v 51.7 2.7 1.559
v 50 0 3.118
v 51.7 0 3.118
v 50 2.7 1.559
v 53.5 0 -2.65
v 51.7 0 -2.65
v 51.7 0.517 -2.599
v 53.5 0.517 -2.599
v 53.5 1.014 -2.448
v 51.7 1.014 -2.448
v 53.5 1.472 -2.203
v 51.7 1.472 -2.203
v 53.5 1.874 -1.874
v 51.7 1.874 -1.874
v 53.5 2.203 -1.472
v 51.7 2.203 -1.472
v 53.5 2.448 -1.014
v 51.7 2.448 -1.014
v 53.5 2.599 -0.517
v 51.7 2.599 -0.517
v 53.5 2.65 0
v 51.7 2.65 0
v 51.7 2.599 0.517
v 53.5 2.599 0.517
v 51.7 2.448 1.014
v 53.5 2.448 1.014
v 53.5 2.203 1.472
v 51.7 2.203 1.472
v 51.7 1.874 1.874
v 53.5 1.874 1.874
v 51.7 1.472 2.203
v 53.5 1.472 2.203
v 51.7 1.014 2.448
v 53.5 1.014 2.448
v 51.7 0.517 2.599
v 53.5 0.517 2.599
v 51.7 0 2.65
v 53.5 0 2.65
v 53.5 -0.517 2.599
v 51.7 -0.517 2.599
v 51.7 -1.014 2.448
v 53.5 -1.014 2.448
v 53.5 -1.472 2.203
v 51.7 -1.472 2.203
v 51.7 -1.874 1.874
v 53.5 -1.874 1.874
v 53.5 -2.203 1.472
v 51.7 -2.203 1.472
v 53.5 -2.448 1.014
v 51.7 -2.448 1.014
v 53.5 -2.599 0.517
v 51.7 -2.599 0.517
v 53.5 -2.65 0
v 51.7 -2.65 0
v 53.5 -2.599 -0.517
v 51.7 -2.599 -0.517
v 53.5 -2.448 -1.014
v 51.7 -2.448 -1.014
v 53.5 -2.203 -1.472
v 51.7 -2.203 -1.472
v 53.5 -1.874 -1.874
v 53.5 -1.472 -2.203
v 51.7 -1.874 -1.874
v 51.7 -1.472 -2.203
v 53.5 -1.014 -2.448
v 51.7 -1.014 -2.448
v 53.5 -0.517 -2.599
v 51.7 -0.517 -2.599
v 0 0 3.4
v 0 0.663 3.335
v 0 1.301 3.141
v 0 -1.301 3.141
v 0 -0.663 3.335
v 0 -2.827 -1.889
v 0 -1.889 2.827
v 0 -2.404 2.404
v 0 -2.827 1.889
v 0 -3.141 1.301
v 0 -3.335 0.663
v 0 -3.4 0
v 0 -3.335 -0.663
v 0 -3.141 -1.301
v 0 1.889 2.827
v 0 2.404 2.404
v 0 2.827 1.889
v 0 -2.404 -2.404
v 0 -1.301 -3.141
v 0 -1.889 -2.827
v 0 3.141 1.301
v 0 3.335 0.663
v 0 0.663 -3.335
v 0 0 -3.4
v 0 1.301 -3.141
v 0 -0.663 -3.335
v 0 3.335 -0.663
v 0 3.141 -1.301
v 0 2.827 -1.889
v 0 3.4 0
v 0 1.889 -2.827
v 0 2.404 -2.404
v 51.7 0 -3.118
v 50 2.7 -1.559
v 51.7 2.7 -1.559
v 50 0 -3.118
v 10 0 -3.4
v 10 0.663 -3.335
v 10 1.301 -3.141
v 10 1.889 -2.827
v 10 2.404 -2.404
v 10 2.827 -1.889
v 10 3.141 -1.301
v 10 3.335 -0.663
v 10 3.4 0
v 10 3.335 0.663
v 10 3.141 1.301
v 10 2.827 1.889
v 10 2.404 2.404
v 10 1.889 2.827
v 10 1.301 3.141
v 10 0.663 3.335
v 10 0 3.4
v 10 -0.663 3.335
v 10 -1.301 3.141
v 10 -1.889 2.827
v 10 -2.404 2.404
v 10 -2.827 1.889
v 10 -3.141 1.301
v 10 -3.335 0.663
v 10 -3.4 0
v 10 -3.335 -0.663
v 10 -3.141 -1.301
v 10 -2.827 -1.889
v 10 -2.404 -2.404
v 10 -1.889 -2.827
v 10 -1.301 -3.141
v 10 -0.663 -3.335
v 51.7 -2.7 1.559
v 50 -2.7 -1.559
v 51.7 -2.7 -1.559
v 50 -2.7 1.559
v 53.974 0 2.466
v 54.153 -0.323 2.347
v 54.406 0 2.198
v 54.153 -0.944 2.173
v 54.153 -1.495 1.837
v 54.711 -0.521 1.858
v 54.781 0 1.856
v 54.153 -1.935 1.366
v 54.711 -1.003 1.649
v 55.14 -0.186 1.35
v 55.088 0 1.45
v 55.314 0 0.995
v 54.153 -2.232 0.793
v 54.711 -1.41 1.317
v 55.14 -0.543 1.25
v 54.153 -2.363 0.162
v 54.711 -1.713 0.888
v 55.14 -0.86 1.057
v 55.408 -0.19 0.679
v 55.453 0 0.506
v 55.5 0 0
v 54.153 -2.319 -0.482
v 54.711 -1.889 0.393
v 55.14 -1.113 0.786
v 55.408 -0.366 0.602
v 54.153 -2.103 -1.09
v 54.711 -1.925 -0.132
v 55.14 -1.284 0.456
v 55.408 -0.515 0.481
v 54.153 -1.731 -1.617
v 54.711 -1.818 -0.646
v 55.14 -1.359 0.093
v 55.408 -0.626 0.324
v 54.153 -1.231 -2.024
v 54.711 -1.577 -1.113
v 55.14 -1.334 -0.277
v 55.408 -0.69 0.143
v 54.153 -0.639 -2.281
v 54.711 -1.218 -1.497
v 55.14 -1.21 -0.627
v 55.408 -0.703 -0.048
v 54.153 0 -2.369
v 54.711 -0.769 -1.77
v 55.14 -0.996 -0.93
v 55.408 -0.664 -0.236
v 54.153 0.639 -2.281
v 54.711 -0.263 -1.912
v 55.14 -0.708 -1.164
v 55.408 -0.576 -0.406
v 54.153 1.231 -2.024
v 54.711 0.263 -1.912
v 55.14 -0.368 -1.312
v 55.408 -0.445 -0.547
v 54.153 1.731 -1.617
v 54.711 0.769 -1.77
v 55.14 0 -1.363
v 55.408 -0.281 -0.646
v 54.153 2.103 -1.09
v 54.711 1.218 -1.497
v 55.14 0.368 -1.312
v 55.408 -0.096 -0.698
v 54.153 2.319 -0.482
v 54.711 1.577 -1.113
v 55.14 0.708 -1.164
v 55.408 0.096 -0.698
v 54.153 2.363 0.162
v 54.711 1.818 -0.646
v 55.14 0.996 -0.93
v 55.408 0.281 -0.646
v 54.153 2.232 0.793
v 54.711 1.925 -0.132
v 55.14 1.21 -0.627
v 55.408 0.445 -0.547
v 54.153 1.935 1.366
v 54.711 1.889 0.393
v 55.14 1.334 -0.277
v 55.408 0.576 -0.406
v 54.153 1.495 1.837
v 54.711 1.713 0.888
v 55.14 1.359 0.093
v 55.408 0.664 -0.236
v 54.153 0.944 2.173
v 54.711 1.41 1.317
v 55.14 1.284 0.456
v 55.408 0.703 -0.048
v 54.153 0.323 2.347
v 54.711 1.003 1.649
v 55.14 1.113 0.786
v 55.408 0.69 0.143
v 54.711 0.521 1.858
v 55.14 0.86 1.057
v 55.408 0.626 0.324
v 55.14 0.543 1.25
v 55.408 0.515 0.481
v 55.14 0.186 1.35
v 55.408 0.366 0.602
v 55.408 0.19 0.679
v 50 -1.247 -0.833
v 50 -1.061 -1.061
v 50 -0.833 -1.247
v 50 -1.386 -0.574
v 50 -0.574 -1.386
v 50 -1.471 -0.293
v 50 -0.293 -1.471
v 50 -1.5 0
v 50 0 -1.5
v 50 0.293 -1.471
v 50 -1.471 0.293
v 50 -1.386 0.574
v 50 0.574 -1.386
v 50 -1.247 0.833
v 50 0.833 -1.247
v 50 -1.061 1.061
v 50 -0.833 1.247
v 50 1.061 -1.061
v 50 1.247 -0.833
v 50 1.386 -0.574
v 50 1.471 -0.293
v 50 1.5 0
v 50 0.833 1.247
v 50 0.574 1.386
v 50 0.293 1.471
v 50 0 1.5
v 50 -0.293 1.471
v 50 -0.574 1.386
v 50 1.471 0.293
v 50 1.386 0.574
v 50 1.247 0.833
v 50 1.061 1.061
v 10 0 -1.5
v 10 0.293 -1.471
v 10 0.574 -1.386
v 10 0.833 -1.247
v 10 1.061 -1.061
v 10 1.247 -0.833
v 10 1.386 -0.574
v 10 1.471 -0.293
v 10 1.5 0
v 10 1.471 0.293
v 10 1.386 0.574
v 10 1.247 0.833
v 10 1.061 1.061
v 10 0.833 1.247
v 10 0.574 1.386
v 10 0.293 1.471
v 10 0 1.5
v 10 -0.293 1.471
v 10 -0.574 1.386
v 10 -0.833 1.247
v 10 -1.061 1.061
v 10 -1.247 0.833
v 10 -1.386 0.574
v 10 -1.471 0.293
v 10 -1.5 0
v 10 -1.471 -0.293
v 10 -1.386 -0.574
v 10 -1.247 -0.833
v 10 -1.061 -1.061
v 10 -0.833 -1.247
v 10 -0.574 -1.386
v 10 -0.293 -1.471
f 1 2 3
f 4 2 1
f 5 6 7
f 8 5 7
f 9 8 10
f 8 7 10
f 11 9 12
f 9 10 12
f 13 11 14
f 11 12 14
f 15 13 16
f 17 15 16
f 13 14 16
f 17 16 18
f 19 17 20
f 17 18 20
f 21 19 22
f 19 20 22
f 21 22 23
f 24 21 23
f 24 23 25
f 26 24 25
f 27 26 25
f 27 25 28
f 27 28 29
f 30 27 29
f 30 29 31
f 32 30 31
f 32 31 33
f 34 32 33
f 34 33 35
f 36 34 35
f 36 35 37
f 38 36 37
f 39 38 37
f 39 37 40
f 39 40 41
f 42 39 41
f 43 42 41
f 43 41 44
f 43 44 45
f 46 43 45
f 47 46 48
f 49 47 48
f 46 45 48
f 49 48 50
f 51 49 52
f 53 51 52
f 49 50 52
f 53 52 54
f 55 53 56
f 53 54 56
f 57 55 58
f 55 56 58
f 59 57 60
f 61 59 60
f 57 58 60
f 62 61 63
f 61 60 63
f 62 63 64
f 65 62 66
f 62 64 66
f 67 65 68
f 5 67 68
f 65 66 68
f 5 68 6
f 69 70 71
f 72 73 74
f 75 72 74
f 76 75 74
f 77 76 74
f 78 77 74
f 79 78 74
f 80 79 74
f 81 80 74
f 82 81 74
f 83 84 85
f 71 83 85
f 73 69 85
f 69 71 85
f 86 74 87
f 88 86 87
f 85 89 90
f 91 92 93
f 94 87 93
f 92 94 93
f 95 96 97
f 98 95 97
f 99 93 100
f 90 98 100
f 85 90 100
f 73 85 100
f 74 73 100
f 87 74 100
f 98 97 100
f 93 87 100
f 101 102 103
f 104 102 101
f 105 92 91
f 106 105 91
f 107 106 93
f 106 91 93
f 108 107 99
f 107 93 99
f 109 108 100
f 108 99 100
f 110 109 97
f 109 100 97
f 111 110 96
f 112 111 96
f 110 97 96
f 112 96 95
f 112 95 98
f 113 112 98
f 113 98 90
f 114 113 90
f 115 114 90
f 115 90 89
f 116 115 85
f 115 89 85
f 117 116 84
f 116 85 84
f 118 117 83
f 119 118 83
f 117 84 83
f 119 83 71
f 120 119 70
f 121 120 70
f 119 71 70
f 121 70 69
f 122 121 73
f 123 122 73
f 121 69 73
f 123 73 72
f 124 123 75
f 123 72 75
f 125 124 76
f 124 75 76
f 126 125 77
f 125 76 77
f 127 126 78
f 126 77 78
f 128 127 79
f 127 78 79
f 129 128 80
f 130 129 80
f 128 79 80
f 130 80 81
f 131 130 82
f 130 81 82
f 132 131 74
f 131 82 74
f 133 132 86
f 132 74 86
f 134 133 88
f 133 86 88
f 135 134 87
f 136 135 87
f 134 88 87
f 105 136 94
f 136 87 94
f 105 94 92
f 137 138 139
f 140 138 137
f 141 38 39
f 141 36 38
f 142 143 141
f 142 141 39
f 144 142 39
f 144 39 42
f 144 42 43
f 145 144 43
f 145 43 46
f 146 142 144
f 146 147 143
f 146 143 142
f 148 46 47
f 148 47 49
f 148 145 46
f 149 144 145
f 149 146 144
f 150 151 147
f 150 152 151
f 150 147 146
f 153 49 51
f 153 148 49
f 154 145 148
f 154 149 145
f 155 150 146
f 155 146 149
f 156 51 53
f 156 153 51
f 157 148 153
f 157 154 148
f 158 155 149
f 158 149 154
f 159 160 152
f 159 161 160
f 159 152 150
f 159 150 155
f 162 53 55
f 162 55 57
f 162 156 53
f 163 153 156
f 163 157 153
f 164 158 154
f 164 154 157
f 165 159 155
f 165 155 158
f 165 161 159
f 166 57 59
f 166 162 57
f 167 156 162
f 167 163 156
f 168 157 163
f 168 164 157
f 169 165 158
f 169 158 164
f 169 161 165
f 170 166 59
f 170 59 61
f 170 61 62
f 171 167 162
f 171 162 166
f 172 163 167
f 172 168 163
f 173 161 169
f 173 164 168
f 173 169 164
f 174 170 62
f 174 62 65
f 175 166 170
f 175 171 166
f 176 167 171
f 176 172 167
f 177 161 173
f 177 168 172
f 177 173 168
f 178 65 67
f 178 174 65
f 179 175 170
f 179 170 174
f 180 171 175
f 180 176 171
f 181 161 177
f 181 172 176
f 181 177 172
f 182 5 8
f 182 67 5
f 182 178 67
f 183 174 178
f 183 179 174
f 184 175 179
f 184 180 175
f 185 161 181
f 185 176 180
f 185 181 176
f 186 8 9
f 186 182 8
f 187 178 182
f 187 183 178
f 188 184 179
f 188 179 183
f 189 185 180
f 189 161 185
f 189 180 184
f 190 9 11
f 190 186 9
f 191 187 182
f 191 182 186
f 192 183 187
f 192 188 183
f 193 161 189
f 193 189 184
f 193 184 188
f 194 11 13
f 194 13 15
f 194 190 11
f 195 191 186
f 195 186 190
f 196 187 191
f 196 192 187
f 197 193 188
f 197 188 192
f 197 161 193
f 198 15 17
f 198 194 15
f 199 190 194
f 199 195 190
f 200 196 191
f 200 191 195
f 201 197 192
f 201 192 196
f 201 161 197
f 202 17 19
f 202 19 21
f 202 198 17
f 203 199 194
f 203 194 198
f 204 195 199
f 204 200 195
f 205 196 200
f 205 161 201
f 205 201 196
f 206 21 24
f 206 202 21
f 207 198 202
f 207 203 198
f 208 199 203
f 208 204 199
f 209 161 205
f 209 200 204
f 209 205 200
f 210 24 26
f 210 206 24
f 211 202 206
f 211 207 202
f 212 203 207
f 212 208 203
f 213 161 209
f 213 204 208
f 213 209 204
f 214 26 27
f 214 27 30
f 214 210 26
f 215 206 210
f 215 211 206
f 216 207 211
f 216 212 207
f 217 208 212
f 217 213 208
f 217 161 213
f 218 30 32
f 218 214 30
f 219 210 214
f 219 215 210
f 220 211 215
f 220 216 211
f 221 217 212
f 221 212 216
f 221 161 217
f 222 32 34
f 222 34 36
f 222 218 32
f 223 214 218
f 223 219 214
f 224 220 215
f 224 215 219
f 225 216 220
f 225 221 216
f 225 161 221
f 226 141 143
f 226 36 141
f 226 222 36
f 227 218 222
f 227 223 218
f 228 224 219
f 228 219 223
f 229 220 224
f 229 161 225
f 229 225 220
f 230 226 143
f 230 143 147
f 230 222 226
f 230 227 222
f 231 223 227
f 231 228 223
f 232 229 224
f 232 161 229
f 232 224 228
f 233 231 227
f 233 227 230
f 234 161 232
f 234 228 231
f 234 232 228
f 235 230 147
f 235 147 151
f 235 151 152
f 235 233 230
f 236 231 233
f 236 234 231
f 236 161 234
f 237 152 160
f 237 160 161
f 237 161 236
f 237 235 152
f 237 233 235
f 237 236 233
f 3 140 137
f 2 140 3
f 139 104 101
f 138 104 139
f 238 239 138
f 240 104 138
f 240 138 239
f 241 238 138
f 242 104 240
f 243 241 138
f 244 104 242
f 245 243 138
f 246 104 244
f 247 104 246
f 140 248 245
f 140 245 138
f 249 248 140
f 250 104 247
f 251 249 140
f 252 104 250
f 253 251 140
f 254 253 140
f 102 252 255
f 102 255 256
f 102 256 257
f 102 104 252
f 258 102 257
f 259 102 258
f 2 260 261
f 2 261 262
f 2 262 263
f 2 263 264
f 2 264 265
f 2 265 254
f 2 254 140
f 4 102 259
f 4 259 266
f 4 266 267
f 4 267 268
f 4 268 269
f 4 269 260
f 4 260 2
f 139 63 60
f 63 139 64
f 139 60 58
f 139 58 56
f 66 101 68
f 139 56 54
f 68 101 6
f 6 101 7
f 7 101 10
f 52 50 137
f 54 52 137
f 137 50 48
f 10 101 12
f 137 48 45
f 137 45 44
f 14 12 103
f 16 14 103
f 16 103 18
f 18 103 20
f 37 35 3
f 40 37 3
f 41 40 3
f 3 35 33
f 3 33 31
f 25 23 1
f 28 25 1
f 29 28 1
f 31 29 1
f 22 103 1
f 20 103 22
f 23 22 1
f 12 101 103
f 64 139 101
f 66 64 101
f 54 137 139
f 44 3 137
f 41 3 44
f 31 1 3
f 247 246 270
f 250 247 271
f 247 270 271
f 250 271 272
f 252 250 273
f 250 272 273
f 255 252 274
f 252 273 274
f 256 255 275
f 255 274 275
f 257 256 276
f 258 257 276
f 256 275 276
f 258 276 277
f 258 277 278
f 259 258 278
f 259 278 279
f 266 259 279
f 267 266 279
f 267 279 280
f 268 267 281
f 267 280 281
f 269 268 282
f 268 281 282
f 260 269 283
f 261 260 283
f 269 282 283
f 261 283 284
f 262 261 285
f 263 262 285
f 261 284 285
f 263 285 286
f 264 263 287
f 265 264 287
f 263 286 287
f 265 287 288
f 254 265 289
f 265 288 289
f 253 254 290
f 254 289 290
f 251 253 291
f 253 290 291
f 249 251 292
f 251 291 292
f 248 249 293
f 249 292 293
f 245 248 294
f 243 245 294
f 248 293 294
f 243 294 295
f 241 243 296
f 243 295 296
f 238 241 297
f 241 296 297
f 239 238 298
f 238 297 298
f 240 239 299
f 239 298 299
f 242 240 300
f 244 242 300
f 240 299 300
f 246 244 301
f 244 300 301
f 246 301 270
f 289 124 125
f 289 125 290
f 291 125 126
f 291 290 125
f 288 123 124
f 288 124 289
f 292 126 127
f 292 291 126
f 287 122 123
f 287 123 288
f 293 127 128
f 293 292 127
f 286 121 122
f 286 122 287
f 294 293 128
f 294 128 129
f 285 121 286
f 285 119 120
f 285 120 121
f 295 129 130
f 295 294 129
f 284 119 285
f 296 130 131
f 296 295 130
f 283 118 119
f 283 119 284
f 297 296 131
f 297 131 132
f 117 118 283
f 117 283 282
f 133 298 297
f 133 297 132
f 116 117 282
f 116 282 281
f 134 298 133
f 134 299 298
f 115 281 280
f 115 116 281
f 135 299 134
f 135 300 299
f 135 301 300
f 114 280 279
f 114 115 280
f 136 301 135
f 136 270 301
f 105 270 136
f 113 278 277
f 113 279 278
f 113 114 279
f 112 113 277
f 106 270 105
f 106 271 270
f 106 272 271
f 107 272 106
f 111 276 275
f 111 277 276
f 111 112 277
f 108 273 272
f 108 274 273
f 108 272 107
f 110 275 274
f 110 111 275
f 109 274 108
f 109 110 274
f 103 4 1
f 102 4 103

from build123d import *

# Parameters (mm, degrees)
SKETCH8_R           = 3.4
BOSS_EXTRUDE1_DEPTH = 10
SKETCH9_R           = 1.5
BOSS_EXTRUDE2_DEPTH = 40
BOSS_EXTRUDE3_DEPTH = 1.7
SKETCH11_R          = 2.65
BOSS_EXTRUDE4_DEPTH = 1.8
DOME1_FACE_RADIUS   = 2.65
DOME1_HEIGHT        = 2


with BuildPart() as part:
    # Sketch8 → Boss-Extrude1 (new body)
    with BuildSketch(Plane(origin=(0, 0, 0), x_dir=(0, 0, -1), z_dir=(1, 0, 0))):
        Circle(SKETCH8_R)
    extrude(amount=BOSS_EXTRUDE1_DEPTH)

    # Sketch9 → Boss-Extrude2 (add)
    with BuildSketch(Plane(origin=(10, 0, 0), x_dir=(0, 0, -1), z_dir=(1, 0, 0))):
        Circle(SKETCH9_R)
    extrude(amount=BOSS_EXTRUDE2_DEPTH)

    # Sketch10 → Boss-Extrude3 (add)
    with BuildSketch(Plane(origin=(50, 0, 0), x_dir=(0, 0, -1), z_dir=(1, 0, 0))):
        Polygon((-1.558845727, 2.7), (1.558845727, 2.7), (3.117691454, 0), (1.558845727, -2.7), (-1.558845727, -2.7), (-3.117691454, 0), align=None)
    extrude(amount=BOSS_EXTRUDE3_DEPTH)

    # Sketch11 → Boss-Extrude4 (add)
    with BuildSketch(Plane(origin=(51.7, 0, 0), x_dir=(0, 0, -1), z_dir=(1, 0, 0))):
        Circle(SKETCH11_R)
    extrude(amount=BOSS_EXTRUDE4_DEPTH)

    # Dome1: a dome of height H over a round flat face of radius A is a cap of a sphere of radius (A * A + H * H) / (2 * H)
    dome1_r = (DOME1_FACE_RADIUS * DOME1_FACE_RADIUS + DOME1_HEIGHT * DOME1_HEIGHT) / (2 * DOME1_HEIGHT)
    dome1_base = Plane((53.5, 0, 0), z_dir=(1, 0, 0))
    with Locations(dome1_base.offset(DOME1_HEIGHT - dome1_r)):
        dome1_ball = Sphere(dome1_r, mode=Mode.PRIVATE)
    add(split(dome1_ball, bisect_by=dome1_base, keep=Keep.TOP, mode=Mode.PRIVATE))


solid = part.part
